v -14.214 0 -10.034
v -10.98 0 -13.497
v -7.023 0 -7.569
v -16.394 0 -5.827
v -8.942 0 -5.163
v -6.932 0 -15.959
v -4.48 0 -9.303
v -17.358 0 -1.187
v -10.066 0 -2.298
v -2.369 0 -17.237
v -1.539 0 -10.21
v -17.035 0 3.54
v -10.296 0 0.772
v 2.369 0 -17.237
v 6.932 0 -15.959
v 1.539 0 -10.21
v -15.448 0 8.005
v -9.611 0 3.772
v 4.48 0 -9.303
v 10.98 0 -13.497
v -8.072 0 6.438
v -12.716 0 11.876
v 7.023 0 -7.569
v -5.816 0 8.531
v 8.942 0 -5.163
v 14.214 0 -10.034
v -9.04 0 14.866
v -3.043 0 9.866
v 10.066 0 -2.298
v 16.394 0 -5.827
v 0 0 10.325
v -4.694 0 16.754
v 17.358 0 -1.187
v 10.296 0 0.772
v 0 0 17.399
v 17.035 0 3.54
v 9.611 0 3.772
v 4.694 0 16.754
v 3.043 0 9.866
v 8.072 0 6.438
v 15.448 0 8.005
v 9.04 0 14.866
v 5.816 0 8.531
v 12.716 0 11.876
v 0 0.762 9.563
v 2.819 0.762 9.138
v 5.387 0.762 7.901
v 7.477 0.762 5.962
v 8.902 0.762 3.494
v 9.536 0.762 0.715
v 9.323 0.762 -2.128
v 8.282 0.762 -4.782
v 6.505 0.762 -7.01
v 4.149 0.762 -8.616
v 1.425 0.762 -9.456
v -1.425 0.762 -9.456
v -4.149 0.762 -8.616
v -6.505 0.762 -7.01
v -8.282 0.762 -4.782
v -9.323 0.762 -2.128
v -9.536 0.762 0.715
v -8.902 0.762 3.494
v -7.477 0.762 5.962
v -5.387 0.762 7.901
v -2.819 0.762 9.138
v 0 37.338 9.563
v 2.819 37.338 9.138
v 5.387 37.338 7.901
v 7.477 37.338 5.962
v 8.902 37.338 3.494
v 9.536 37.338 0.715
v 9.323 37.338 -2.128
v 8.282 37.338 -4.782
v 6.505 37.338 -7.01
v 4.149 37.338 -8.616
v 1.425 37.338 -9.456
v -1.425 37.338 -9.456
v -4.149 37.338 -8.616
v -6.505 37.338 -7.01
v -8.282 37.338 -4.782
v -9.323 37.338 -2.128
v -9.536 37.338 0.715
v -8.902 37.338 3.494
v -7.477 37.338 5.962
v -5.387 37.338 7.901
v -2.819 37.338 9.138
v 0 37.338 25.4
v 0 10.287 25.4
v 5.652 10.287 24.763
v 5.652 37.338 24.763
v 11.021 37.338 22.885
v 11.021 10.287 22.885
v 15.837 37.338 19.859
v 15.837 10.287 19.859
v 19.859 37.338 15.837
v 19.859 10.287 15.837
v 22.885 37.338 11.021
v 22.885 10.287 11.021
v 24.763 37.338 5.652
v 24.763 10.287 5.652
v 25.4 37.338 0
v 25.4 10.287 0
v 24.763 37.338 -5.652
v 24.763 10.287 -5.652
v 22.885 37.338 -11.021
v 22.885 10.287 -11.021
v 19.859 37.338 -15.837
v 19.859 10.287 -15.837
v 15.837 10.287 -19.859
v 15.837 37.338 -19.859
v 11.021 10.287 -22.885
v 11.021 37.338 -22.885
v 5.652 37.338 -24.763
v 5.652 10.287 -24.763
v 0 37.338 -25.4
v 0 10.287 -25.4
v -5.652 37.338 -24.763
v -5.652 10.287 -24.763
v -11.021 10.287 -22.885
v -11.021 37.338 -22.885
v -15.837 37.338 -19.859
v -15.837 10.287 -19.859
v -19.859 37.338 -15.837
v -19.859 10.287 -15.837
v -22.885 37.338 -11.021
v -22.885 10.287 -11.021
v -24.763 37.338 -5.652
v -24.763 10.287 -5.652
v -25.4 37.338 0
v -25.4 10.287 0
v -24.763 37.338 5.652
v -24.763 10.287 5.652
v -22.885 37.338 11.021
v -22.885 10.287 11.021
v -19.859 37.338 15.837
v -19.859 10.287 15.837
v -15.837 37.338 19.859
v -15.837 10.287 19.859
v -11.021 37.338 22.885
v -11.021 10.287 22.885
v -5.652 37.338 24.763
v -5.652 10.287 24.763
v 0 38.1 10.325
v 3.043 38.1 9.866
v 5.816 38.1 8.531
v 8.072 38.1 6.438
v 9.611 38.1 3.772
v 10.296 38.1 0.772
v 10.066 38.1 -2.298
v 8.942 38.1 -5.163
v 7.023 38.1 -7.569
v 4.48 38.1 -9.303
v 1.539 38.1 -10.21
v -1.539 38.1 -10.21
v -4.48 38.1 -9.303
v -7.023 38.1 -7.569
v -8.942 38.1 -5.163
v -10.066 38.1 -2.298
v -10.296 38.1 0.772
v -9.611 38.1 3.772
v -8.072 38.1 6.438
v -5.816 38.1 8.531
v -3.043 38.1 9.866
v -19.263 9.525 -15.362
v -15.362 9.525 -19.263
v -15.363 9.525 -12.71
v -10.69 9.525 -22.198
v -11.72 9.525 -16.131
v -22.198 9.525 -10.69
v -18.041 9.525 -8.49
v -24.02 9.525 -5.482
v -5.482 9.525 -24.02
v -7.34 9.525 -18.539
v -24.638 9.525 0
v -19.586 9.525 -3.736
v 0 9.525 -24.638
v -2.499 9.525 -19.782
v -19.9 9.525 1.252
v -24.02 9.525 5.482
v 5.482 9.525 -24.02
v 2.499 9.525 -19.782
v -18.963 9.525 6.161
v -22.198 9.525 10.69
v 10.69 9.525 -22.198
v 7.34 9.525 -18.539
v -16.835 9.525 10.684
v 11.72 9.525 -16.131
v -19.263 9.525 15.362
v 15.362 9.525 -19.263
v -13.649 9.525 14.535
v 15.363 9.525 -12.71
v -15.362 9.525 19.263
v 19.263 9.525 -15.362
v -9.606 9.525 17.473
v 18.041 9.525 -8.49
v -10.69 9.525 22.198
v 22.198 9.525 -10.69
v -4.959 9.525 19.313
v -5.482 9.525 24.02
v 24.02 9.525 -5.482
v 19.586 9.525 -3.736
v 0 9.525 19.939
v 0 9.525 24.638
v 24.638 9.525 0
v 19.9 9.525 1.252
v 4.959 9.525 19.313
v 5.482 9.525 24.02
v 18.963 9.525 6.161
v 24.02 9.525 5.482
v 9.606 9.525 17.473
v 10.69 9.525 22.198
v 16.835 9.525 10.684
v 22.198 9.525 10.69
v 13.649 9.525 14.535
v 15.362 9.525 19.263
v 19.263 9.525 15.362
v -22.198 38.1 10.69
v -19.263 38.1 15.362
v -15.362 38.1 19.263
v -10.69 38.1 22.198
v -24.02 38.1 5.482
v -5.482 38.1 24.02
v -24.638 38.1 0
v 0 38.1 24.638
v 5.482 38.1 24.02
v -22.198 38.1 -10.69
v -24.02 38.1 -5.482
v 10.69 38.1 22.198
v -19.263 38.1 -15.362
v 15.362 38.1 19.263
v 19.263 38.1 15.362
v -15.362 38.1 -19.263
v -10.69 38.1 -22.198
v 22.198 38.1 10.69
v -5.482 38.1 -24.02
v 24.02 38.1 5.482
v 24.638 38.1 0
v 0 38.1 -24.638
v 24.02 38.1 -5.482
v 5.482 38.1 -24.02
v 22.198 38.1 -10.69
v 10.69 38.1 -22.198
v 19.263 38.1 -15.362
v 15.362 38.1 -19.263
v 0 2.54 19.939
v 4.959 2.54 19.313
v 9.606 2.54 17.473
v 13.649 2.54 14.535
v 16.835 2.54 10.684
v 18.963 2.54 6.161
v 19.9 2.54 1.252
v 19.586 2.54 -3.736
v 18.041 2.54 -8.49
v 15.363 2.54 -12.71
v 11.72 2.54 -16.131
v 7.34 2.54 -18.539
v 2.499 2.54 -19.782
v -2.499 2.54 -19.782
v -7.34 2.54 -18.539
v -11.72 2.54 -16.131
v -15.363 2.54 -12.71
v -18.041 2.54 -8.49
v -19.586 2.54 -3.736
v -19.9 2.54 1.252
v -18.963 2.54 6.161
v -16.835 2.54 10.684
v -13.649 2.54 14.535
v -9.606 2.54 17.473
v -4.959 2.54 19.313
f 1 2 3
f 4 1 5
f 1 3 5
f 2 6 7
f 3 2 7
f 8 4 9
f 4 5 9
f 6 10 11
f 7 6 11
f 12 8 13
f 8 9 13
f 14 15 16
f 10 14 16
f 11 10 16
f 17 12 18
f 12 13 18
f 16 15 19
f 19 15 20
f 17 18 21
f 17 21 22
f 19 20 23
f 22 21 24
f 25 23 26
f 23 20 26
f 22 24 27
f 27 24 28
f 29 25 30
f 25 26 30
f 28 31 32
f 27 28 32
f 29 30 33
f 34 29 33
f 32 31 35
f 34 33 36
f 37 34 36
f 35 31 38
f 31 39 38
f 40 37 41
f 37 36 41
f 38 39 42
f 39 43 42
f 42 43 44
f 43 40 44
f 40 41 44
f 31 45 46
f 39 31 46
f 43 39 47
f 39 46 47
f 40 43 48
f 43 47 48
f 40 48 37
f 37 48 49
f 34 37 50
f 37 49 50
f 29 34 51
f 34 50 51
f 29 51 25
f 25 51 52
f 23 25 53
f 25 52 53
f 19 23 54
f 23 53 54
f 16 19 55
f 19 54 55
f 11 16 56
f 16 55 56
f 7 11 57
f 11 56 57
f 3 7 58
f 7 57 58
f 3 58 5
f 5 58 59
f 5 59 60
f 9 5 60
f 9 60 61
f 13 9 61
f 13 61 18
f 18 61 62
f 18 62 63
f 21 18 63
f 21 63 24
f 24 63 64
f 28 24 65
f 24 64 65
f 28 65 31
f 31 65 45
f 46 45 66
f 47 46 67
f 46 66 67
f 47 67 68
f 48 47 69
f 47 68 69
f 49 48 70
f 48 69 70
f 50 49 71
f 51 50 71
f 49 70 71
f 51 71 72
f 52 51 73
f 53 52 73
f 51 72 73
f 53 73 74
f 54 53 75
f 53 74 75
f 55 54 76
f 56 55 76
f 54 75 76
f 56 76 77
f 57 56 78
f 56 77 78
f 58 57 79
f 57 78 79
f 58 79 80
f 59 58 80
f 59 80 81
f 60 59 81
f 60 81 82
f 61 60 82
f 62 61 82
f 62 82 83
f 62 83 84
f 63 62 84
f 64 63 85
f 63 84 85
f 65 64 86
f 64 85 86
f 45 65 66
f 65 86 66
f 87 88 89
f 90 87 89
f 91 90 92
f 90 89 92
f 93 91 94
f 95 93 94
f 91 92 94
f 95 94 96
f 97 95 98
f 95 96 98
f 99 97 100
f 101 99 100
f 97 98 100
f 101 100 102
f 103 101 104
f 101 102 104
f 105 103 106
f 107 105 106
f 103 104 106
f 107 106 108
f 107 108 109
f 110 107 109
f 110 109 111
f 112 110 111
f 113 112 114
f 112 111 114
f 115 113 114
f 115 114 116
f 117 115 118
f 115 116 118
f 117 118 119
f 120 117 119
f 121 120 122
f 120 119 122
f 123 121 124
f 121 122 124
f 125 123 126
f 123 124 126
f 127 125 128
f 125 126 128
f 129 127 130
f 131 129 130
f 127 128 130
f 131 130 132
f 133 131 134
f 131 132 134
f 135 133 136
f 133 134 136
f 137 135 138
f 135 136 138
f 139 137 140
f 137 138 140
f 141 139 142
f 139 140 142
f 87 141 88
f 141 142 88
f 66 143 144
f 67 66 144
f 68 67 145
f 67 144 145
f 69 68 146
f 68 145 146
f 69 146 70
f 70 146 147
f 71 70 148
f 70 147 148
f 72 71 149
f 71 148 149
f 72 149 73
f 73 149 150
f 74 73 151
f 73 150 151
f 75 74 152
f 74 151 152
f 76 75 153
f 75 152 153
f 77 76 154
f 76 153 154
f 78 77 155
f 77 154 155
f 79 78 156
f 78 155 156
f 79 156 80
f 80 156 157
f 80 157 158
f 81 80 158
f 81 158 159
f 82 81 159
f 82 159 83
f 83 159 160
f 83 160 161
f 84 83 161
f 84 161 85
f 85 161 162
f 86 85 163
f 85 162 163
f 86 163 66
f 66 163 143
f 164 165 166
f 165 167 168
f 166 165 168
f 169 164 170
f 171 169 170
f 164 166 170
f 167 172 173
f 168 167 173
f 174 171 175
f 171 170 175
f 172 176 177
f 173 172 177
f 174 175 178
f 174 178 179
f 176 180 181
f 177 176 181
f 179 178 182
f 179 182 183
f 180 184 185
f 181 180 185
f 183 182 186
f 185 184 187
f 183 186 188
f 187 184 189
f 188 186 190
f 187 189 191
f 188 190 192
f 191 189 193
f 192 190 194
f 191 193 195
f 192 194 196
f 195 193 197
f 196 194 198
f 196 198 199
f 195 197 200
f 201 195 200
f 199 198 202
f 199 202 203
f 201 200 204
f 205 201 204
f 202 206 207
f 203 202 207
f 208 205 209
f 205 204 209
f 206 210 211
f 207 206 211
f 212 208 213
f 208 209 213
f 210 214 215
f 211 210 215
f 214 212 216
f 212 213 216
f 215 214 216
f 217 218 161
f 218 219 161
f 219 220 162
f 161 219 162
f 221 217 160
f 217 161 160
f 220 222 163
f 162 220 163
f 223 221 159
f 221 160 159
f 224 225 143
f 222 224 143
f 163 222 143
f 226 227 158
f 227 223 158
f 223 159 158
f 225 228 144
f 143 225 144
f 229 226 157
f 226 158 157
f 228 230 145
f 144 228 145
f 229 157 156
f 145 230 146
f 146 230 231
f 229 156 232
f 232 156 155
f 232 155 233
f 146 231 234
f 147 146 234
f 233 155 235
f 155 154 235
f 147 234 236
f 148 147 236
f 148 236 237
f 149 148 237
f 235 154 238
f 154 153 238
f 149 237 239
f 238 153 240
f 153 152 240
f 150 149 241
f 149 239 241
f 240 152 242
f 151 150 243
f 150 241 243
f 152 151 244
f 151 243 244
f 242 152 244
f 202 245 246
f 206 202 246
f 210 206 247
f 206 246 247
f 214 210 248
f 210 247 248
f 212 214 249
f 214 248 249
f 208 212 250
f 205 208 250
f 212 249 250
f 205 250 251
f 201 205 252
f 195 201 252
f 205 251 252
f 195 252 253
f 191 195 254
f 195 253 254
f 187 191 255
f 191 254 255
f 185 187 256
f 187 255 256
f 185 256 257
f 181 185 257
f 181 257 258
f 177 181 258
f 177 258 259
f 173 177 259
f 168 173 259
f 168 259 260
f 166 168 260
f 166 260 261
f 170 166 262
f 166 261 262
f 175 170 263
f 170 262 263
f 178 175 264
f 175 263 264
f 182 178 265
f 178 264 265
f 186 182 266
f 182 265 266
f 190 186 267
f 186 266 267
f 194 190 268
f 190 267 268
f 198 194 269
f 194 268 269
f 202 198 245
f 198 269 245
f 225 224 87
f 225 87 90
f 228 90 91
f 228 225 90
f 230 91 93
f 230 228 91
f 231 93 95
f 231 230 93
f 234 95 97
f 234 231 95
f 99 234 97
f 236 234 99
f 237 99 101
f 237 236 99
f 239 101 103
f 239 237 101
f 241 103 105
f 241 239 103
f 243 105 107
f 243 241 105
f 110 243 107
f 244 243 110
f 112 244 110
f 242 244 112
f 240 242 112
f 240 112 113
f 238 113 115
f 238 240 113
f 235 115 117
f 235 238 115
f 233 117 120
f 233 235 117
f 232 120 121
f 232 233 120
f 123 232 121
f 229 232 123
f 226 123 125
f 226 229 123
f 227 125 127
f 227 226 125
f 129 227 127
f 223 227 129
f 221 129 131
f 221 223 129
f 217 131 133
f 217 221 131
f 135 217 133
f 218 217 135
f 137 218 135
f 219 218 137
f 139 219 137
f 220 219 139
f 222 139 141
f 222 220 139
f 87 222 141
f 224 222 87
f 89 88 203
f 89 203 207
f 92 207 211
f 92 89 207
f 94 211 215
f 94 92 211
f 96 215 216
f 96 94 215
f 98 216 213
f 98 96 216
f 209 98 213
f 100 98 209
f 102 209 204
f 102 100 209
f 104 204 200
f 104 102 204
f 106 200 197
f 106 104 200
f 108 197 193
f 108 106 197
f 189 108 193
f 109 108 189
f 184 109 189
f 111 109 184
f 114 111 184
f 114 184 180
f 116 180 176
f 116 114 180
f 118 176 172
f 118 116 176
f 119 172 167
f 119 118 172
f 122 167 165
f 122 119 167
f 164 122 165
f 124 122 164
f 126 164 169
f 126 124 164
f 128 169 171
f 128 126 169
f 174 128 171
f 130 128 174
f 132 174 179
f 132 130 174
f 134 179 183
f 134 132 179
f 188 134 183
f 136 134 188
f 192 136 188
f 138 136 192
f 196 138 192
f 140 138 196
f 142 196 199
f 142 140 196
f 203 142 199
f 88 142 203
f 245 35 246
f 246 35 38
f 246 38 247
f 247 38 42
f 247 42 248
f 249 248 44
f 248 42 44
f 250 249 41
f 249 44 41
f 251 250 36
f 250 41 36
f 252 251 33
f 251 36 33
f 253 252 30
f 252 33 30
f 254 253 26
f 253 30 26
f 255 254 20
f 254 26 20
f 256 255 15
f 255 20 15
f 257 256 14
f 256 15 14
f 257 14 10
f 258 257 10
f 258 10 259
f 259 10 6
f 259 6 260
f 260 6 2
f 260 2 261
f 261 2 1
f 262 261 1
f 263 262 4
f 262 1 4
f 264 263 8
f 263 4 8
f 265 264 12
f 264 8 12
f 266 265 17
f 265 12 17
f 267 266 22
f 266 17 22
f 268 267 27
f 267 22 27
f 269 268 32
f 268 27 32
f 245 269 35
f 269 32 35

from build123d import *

# Parameters (mm, degrees)
F2_SIZE = 2.54
F3_SIZE = 0.762


with BuildPart() as f1:
    # F0 (on Right) → F1 (revolve)
    with BuildSketch(Plane.YZ):
        Polygon((9.525, 19.939), (0, 19.939), (0, 9.5631), (38.1, 9.5631), (38.1, 25.4), (9.525, 25.4), align=None)
    revolve(axis=Axis((0, 8.629879, 0), (0, 1, 0)))

    # F2
    f2_edges = [f1.edges().sort_by_distance(p)[0] for p in [
        (0, 0, -19.939),
    ]]
    chamfer(f2_edges, length=F2_SIZE)

    # F3
    f3_edges = [f1.edges().sort_by_distance(p)[0] for p in [
        (0, 0, -9.5631),
        (0, 38.1, -9.5631),
        (0, 19.05, 9.5631),
        (0, 38.1, -25.4),
        (0, 9.525, -25.4),
        (0, 23.8125, 25.4),
    ]]
    chamfer(f3_edges, length=F3_SIZE)


solid = f1.part
